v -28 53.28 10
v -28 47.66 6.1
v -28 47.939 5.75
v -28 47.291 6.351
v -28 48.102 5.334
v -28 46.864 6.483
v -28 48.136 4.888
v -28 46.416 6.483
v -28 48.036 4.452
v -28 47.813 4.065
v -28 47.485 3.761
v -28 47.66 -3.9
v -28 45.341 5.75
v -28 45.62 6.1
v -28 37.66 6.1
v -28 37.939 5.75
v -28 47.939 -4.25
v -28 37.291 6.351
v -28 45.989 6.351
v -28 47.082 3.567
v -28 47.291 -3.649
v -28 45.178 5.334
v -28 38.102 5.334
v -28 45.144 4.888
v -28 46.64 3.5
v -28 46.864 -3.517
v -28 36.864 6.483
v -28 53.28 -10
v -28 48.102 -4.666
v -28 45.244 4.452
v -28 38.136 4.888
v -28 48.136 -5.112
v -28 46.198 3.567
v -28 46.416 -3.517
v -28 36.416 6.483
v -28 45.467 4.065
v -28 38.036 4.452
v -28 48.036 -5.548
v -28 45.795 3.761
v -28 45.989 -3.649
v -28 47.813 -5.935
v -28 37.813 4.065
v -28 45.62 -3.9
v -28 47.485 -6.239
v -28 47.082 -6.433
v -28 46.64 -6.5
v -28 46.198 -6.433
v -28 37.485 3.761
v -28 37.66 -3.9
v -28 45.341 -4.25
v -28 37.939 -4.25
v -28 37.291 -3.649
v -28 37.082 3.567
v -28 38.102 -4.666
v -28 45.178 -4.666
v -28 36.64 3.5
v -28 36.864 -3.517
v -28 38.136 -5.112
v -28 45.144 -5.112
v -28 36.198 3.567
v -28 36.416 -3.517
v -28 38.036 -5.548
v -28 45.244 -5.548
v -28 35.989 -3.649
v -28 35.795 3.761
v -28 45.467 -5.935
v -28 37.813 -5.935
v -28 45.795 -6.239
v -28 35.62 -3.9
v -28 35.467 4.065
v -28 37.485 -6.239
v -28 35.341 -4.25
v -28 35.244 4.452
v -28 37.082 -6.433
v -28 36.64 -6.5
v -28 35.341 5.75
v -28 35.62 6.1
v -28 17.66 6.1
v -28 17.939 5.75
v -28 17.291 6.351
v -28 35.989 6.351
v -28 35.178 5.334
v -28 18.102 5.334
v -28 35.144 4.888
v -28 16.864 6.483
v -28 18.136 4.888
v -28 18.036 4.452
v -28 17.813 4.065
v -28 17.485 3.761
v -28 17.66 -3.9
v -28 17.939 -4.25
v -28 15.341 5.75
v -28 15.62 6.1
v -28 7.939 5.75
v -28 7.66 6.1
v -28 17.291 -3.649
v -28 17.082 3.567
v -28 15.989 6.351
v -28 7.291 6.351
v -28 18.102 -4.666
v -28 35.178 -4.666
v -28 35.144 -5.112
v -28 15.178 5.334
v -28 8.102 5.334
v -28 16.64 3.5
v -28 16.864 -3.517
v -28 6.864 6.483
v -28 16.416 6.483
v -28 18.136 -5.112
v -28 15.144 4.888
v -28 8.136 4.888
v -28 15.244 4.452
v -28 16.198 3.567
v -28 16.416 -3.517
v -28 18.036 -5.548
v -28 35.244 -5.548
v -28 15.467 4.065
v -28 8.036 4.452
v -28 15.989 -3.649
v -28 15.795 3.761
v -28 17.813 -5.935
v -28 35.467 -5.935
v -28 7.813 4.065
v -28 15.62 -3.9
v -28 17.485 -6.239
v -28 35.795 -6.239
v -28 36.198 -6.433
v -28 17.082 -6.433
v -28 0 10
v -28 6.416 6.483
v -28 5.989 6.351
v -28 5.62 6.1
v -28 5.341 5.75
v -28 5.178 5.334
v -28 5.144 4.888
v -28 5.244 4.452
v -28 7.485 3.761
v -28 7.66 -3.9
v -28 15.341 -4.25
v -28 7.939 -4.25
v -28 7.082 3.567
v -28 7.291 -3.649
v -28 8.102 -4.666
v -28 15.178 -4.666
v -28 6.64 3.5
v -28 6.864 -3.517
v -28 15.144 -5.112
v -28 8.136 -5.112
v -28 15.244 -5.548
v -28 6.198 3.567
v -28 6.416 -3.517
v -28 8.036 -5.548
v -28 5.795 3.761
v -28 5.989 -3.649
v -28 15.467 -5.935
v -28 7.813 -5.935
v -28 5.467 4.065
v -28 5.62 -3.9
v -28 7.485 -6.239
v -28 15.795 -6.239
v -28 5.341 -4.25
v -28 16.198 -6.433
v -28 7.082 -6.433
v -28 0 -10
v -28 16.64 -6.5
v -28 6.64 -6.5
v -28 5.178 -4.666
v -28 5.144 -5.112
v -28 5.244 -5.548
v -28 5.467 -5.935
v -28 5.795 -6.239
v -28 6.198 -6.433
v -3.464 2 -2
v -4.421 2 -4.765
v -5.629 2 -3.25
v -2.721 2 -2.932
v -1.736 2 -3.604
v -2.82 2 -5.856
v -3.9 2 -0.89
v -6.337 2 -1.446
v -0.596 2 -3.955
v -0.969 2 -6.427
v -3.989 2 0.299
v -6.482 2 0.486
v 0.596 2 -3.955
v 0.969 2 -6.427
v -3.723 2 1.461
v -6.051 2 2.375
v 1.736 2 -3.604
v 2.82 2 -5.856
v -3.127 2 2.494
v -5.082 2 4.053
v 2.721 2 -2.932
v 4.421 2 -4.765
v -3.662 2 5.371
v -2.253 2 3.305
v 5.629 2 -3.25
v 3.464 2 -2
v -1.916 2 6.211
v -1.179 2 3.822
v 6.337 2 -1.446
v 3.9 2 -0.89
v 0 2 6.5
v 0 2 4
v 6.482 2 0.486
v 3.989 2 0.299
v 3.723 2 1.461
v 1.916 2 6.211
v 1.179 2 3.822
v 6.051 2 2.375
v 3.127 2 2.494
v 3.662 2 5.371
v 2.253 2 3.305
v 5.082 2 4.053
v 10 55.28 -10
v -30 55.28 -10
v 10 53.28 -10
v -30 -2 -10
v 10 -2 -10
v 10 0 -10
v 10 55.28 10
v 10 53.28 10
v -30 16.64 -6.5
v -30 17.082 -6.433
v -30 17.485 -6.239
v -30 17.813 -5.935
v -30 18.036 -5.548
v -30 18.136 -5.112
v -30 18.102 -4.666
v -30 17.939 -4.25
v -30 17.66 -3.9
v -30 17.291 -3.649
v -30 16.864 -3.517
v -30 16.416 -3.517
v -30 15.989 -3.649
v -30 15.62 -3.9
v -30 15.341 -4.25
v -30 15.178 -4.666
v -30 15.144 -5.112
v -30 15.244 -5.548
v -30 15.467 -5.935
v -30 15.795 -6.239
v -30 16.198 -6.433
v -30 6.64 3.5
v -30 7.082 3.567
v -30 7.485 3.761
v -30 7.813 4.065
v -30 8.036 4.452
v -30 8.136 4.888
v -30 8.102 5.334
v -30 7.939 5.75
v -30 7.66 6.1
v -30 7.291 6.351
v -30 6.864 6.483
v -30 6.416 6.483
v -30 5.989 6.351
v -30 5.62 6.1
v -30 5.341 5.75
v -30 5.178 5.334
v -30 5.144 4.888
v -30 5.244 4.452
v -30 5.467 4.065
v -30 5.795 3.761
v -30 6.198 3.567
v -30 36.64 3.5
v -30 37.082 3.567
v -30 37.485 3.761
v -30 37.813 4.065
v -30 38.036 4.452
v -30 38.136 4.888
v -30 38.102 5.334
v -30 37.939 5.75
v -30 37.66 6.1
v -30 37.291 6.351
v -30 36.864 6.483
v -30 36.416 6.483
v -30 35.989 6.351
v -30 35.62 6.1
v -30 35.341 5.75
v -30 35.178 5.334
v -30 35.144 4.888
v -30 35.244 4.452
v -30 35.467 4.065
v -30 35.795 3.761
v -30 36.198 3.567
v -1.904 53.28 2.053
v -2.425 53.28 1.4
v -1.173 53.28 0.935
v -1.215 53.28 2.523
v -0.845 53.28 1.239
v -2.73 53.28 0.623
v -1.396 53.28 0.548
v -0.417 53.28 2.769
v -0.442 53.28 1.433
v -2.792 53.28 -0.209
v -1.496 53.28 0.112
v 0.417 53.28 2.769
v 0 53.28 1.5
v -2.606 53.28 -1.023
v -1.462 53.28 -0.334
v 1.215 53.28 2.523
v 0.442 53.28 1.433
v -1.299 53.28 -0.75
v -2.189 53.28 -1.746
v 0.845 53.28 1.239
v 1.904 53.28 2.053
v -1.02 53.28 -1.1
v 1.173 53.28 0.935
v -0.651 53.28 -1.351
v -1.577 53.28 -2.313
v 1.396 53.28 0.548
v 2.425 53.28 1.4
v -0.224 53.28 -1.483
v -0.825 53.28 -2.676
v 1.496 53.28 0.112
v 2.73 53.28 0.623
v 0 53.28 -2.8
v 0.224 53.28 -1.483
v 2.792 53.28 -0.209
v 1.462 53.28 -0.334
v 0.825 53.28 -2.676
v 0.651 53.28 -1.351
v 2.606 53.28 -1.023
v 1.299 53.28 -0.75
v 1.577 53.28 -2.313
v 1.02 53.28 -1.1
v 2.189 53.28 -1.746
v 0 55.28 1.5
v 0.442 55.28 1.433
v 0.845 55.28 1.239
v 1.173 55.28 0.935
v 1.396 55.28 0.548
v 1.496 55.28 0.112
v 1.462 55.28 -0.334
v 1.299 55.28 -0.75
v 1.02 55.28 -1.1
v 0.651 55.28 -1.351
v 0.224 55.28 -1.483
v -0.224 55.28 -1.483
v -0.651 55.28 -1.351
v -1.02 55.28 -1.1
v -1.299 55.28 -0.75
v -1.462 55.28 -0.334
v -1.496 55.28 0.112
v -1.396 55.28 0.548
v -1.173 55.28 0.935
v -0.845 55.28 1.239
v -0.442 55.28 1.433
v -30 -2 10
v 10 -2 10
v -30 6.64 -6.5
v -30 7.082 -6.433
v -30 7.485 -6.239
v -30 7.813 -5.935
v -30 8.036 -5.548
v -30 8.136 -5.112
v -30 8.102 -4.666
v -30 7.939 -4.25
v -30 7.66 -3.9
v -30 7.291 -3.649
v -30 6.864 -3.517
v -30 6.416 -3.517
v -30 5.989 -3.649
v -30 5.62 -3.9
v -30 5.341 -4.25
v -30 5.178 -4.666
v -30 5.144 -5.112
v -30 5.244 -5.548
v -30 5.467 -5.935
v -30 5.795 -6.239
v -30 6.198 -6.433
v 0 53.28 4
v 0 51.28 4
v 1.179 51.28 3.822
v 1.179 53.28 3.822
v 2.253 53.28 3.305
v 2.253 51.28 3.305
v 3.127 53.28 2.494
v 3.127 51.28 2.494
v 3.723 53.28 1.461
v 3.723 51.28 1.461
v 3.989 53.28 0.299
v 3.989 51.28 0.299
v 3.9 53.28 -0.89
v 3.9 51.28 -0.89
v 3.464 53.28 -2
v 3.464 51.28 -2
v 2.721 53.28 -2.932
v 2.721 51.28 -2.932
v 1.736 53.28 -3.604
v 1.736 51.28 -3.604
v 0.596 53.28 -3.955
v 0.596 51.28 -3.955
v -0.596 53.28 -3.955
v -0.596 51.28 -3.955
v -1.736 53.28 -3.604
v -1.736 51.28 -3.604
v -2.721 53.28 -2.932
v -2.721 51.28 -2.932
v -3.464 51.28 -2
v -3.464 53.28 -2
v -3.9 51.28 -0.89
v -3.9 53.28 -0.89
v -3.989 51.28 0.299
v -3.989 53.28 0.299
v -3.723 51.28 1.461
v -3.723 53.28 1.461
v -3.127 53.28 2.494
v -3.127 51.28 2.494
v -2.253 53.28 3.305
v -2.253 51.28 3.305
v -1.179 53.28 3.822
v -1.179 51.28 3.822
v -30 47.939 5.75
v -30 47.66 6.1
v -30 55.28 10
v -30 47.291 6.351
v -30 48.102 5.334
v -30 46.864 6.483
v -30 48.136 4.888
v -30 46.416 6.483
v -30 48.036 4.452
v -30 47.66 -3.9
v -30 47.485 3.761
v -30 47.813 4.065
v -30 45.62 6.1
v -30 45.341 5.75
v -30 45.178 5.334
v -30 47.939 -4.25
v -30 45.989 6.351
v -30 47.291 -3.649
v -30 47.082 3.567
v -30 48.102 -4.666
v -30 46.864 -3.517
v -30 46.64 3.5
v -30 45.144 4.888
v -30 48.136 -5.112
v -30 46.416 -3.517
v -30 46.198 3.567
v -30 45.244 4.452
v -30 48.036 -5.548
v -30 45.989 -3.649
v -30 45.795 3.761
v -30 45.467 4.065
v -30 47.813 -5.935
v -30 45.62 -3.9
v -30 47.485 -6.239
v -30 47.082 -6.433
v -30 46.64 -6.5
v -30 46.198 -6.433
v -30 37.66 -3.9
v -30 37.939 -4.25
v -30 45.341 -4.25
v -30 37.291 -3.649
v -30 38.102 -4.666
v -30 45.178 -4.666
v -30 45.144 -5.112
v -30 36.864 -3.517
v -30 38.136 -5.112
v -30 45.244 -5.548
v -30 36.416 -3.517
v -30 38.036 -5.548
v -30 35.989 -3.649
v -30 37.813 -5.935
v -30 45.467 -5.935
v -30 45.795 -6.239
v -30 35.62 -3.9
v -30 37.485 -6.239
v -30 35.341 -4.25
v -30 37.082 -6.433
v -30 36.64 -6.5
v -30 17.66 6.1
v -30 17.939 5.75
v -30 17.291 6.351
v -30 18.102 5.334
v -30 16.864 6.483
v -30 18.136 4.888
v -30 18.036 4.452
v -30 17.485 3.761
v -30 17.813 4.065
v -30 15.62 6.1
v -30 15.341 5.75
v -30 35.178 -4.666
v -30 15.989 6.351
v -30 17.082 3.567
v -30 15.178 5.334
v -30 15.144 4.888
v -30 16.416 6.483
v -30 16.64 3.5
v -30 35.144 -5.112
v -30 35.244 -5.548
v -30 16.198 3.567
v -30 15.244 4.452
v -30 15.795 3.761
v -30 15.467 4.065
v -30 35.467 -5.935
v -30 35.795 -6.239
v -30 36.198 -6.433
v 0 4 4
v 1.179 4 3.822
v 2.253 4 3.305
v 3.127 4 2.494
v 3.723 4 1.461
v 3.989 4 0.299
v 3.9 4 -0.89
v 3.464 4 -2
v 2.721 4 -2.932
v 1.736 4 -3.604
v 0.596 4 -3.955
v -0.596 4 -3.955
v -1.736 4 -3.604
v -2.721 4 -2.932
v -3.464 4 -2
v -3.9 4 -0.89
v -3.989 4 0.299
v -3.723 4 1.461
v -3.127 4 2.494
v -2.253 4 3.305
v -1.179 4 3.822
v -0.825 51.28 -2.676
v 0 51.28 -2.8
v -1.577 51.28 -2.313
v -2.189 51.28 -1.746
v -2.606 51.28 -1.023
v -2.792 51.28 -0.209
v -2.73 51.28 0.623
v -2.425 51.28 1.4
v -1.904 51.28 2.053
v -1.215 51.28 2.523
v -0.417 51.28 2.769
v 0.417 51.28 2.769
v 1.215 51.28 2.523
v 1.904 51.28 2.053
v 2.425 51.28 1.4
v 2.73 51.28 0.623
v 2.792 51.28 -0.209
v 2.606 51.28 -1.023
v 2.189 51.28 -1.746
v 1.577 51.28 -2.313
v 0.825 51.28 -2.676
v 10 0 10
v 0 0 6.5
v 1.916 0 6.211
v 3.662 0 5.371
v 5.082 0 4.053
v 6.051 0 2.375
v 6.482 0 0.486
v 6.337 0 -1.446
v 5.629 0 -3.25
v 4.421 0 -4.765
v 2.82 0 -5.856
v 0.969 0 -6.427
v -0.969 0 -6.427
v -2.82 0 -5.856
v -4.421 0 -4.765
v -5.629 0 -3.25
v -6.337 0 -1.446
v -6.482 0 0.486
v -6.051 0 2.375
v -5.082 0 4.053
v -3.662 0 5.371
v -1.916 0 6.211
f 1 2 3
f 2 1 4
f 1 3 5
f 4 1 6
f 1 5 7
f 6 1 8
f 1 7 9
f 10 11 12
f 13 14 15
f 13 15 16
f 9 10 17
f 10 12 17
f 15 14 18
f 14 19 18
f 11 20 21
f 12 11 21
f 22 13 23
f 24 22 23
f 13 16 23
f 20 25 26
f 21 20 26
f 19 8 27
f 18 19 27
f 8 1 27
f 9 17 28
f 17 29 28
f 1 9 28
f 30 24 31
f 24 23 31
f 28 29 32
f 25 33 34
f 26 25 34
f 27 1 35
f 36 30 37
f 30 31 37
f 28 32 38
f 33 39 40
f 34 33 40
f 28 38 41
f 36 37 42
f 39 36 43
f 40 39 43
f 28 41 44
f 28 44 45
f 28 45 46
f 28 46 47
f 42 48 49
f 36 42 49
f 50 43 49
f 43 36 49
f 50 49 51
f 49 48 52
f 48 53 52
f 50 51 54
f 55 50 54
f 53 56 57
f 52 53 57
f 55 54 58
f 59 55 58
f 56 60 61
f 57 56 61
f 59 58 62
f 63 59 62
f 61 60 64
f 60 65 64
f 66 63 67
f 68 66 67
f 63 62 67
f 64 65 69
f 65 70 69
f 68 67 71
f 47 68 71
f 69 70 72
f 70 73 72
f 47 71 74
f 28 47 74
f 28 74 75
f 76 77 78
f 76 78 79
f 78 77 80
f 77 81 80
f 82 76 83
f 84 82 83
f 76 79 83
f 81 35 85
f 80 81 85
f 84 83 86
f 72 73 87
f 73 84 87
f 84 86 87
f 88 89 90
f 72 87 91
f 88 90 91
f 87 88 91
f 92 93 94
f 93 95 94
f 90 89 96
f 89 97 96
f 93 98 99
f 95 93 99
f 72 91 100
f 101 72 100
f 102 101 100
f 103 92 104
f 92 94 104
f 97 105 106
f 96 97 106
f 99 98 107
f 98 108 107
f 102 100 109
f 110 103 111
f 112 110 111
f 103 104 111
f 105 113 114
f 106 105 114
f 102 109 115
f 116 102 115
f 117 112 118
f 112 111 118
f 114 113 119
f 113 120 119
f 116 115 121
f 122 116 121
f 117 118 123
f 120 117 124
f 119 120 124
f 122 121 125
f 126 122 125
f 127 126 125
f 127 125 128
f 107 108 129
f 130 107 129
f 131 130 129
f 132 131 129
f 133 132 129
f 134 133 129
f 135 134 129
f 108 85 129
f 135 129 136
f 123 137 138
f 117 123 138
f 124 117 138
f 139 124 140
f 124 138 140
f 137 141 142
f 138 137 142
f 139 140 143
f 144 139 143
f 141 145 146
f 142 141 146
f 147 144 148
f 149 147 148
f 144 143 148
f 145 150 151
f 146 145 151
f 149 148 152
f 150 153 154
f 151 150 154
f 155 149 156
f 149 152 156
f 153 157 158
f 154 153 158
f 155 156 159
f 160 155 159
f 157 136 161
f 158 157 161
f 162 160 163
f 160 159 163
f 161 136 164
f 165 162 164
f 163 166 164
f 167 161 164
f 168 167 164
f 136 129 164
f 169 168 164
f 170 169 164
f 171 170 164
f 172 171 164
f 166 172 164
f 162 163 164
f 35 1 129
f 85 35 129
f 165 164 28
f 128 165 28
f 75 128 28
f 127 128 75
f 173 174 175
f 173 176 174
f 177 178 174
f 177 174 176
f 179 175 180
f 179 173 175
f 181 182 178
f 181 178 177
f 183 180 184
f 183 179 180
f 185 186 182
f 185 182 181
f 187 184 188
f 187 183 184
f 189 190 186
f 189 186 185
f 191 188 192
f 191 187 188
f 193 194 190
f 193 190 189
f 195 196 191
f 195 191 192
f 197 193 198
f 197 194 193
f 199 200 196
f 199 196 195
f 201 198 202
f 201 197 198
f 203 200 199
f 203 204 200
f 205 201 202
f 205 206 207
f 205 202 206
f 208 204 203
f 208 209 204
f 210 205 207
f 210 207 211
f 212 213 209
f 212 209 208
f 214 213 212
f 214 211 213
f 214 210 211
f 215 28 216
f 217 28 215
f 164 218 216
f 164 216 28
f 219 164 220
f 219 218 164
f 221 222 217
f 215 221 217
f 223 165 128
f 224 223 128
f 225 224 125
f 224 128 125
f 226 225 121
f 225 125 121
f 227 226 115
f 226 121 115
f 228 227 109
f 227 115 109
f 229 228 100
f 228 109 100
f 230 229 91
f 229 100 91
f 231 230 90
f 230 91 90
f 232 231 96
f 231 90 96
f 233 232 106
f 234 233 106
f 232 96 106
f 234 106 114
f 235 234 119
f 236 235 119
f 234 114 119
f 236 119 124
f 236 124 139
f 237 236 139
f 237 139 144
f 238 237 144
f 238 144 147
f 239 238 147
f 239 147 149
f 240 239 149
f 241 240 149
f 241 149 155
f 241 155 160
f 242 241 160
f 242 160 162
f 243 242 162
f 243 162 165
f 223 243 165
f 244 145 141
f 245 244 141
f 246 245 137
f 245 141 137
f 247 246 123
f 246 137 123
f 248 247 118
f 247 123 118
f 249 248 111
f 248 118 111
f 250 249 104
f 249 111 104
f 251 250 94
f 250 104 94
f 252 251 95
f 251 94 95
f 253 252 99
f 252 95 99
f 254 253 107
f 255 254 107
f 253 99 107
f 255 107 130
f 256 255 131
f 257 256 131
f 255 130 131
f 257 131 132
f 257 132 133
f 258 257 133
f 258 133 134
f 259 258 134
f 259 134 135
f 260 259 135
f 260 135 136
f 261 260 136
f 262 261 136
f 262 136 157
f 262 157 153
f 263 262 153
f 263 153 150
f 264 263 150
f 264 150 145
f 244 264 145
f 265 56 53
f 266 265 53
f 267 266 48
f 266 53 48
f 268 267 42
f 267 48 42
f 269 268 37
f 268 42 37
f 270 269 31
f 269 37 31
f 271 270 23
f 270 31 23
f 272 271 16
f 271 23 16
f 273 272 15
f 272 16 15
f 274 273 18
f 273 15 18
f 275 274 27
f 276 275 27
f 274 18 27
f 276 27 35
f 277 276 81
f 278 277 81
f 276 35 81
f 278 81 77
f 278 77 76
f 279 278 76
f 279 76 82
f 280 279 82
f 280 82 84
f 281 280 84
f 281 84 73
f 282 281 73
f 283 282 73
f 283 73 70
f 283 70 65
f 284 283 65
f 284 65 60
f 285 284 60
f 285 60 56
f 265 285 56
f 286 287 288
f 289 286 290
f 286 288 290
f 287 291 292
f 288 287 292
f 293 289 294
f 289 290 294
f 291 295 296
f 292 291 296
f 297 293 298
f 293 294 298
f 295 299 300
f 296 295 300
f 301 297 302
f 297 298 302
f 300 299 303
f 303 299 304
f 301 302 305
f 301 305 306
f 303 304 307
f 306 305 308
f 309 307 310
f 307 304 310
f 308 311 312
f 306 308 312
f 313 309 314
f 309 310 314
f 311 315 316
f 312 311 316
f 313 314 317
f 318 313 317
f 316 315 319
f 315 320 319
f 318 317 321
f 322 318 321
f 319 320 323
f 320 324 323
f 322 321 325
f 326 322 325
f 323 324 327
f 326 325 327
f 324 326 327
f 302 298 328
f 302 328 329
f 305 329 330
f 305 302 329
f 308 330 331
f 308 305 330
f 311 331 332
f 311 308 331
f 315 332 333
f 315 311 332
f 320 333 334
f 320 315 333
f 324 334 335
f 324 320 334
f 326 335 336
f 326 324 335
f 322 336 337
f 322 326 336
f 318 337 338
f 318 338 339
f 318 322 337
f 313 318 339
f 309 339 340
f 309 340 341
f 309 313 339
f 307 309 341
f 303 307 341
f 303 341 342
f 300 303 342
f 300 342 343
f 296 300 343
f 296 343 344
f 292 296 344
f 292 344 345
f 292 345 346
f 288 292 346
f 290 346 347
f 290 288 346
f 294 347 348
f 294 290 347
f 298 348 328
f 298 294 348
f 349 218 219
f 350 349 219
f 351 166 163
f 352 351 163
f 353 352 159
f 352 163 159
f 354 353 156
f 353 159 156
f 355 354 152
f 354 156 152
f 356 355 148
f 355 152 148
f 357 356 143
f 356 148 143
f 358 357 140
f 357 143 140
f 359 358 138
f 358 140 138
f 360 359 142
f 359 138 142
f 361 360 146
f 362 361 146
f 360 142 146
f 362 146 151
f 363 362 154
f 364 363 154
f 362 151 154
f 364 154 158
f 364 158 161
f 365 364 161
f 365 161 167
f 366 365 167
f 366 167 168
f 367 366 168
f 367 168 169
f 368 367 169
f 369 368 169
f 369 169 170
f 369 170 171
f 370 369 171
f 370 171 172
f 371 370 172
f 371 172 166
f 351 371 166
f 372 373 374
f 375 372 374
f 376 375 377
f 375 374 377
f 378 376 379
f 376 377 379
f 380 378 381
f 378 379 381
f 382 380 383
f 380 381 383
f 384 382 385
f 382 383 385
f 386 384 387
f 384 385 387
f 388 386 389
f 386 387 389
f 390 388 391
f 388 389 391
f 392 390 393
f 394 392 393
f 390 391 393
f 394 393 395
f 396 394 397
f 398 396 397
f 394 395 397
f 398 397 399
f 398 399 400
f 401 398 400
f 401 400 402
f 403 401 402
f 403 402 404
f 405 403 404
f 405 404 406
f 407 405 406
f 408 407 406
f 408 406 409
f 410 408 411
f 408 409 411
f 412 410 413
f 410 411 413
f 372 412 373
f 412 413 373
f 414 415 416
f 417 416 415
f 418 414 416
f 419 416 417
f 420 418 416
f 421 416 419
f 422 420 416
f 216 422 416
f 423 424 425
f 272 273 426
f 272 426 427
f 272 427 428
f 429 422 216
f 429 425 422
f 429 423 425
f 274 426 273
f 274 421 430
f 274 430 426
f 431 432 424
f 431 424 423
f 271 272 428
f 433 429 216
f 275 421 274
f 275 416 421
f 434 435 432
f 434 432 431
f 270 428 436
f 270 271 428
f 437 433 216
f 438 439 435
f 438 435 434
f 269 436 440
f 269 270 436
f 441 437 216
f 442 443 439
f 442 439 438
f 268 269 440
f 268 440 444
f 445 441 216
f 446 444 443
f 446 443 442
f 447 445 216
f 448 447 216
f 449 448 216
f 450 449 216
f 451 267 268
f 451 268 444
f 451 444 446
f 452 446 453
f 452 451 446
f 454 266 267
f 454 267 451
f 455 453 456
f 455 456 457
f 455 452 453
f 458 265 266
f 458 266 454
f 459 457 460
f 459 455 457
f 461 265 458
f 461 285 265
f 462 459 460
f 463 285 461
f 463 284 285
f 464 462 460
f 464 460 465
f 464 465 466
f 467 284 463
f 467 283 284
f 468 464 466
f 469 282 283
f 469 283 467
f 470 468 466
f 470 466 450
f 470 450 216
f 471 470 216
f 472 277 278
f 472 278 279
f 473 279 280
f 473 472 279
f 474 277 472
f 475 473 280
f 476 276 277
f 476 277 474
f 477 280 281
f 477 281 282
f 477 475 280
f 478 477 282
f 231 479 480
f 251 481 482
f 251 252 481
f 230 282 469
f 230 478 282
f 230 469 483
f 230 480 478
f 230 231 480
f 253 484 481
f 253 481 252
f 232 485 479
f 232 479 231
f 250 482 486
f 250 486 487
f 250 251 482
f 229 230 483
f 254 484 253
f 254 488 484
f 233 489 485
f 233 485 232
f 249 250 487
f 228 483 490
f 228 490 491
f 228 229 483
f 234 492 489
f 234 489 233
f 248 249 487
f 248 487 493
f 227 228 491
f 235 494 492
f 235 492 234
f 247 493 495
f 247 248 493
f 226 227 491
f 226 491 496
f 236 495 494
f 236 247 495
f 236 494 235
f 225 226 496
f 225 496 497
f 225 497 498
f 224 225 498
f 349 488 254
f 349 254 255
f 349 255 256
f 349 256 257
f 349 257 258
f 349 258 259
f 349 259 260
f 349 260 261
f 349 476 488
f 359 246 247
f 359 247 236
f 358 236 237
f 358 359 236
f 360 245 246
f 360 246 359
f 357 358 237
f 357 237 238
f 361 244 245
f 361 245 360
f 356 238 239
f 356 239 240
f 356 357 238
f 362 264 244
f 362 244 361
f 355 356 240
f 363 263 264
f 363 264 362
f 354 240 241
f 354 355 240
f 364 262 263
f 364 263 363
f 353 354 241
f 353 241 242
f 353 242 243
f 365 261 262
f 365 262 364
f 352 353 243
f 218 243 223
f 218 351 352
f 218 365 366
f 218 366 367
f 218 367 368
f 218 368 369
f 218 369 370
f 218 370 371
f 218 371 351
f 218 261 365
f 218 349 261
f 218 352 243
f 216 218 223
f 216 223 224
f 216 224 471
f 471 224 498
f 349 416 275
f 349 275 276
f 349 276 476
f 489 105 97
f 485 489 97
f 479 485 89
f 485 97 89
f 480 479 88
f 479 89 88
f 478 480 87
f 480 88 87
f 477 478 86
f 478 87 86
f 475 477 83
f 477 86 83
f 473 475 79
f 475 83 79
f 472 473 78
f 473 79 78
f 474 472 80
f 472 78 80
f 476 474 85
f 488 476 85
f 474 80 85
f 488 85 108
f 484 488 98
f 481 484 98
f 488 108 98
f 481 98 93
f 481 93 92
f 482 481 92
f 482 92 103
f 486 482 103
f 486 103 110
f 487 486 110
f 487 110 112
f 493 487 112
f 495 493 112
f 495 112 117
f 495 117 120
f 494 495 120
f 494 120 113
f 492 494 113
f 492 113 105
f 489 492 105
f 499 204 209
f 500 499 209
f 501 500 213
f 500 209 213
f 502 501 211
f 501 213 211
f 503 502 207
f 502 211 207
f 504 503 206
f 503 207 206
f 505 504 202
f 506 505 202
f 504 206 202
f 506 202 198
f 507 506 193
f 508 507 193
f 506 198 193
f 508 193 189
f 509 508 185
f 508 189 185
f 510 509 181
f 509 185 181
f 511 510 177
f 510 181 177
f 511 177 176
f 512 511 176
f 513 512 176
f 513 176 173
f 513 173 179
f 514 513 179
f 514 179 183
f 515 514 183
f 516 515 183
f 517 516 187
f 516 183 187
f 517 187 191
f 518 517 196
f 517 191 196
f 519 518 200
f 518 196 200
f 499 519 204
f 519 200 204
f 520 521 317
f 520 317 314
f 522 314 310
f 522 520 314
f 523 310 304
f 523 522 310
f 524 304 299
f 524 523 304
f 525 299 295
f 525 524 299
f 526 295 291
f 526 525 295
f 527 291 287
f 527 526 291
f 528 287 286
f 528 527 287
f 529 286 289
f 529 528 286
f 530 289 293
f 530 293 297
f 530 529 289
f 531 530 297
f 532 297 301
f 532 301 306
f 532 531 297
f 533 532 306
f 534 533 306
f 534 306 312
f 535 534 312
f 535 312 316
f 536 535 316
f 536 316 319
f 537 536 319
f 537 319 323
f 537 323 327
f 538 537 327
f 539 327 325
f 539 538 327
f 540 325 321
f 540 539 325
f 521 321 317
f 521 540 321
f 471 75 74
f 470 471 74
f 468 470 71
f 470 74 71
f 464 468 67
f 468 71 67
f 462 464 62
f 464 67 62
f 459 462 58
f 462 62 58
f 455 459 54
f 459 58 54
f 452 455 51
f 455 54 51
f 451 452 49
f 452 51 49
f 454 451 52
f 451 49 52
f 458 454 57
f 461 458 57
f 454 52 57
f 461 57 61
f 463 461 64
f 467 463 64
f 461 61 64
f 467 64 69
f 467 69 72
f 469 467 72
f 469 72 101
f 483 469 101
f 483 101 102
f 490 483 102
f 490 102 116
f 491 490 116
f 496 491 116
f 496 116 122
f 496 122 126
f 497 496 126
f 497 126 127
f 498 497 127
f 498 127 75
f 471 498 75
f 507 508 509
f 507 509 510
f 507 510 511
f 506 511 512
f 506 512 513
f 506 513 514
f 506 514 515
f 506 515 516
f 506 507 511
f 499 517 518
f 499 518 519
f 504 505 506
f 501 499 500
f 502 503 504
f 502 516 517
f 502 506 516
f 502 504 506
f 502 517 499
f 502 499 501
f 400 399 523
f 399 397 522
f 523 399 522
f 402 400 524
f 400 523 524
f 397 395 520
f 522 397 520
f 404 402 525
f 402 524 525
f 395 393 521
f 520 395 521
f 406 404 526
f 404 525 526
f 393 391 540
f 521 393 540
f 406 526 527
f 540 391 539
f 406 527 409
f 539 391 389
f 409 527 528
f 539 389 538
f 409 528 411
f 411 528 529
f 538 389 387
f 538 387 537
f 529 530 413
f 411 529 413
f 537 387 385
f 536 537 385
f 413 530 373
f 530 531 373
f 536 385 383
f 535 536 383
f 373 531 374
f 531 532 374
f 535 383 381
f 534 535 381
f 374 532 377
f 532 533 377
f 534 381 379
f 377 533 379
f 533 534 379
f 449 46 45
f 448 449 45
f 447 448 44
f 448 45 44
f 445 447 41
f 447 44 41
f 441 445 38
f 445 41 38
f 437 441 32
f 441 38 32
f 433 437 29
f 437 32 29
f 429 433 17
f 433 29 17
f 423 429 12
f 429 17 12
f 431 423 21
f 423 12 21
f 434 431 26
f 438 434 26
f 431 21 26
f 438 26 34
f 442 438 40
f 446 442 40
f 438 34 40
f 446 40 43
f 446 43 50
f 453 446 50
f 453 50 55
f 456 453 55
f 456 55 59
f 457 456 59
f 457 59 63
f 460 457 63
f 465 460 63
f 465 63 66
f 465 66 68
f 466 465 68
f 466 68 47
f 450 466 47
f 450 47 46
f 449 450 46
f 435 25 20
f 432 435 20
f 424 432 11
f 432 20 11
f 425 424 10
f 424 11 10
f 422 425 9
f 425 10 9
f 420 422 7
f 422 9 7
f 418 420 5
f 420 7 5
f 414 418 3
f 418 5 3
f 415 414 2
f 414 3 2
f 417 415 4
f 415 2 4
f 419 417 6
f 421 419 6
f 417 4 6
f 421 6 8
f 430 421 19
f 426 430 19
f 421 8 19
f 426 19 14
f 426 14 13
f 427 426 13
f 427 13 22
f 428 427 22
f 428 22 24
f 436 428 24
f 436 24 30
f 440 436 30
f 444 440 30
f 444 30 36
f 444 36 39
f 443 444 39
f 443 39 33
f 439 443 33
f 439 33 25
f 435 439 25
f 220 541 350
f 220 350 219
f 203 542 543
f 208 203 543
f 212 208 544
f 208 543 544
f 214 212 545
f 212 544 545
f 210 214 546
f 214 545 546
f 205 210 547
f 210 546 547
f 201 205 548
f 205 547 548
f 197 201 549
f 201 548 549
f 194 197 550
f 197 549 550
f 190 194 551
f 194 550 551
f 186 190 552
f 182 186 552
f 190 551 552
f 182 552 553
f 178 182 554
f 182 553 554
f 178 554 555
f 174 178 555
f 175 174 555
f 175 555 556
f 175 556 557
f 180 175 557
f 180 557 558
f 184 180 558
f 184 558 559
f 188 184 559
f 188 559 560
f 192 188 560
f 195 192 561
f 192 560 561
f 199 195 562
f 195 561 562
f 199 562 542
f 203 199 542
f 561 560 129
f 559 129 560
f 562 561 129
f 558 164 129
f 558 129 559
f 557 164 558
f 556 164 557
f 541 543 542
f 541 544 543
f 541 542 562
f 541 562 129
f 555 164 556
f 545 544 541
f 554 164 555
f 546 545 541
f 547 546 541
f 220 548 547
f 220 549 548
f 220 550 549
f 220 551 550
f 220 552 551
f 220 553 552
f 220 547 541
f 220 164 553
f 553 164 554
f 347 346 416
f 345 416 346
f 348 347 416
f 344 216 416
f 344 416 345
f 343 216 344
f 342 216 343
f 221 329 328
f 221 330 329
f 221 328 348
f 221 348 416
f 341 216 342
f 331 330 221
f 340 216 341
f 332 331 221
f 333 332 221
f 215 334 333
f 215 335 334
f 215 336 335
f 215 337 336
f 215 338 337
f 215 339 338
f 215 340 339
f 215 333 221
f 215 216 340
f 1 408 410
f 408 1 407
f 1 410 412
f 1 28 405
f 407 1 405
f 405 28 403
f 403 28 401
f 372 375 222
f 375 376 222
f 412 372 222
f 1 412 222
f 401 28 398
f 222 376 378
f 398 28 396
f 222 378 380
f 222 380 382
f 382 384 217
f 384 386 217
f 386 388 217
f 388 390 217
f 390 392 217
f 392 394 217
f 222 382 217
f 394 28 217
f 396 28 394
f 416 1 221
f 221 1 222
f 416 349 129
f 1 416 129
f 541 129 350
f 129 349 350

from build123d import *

# Parameters (mm, degrees)
SKETCH1_R                 = 6.5
SKETCH1_R_2               = 4
SKETCH1_R_3               = 2.8
SKETCH1_R_4               = 1.5
BOSS_EXTRUDE1_DEPTH       = 2
BOSS_EXTRUDE2_START       = 2
SKETCH1_3_R               = 4
SKETCH1_3_R_2             = 2.8
SKETCH1_3_R_3             = 1.5
BOSS_EXTRUDE2_DEPTH       = 2
SKETCH1_4_W               = 40
SKETCH1_4_H               = 20
BOSS_EXTRUDE3_DEPTH       = 2
SKETCH2_W                 = 2
SKETCH2_H                 = 20
BOSS_EXTRUDE4_DEPTH       = 53.28
BOSS_EXTRUDE5_START       = 53.28
SKETCH1_5_W               = 40
SKETCH1_5_H               = 20
SKETCH1_5_R               = 6.5
SKETCH1_5_R_2             = 4
SKETCH1_5_R_3             = 2.8
SKETCH1_5_R_4             = 1.5
BOSS_EXTRUDE5_DEPTH       = 2
BOSS_EXTRUDE6_START       = 51.28
SKETCH1_6_R               = 4
SKETCH1_6_R_2             = 2.8
BOSS_EXTRUDE6_DEPTH       = 2
F_3_0MM_DOWEL_HOLE1_D     = 3
F_3_0MM_DOWEL_HOLE1_DEPTH = 7
F_3_0MM_DOWEL_HOLE1_TIP   = 0.901290929


with BuildPart() as part:
    # Sketch1 → Boss-Extrude1 (new body)
    # profile 1 of 4: a face of its own
    with BuildSketch(Plane(origin=(0, 0, 0), x_dir=(1, 0, 0), z_dir=(0, 1, 0))):
        with Locations(Location((0, 0, 0), (0, 0, 270))):
            Circle(SKETCH1_R)
        Circle(SKETCH1_R_2, mode=Mode.SUBTRACT)
    # profile 2 of 4: a face of its own
    with BuildSketch(Plane(origin=(0, 0, 0), x_dir=(1, 0, 0), z_dir=(0, 1, 0))):
        Circle(SKETCH1_R_2)
        Circle(SKETCH1_R_3, mode=Mode.SUBTRACT)
    # profile 3 of 4: a face of its own
    with BuildSketch(Plane(origin=(0, 0, 0), x_dir=(1, 0, 0), z_dir=(0, 1, 0))):
        Circle(SKETCH1_R_3)
        Circle(SKETCH1_R_4, mode=Mode.SUBTRACT)
    # profile 4 of 4: a face of its own
    with BuildSketch(Plane(origin=(0, 0, 0), x_dir=(1, 0, 0), z_dir=(0, 1, 0))):
        Circle(SKETCH1_R_4)
    extrude(amount=BOSS_EXTRUDE1_DEPTH)

    # Sketch1<3> → Boss-Extrude2 (add)
    # profile 1 of 3: a face of its own
    with BuildSketch(Plane(origin=(0, 0, 0), x_dir=(1, 0, 0), z_dir=(0, 1, 0)).offset(BOSS_EXTRUDE2_START)):
        with Locations(Location((0, 0, 0), (0, 0, 270))):
            Circle(SKETCH1_3_R)
        Circle(SKETCH1_3_R_2, mode=Mode.SUBTRACT)
    # profile 2 of 3: a face of its own
    with BuildSketch(Plane(origin=(0, 0, 0), x_dir=(1, 0, 0), z_dir=(0, 1, 0)).offset(BOSS_EXTRUDE2_START)):
        Circle(SKETCH1_3_R_2)
        Circle(SKETCH1_3_R_3, mode=Mode.SUBTRACT)
    # profile 3 of 3: a face of its own
    with BuildSketch(Plane(origin=(0, 0, 0), x_dir=(1, 0, 0), z_dir=(0, 1, 0)).offset(BOSS_EXTRUDE2_START)):
        Circle(SKETCH1_3_R_3)
    extrude(amount=BOSS_EXTRUDE2_DEPTH)

    # Sketch1<4> → Boss-Extrude3 (add)
    with BuildSketch(Plane(origin=(0, 0, 0), x_dir=(1, 0, 0), z_dir=(0, 1, 0))):
        with Locations((-10, 0)):
            Rectangle(SKETCH1_4_W, SKETCH1_4_H)
    extrude(amount=-BOSS_EXTRUDE3_DEPTH)

    # Sketch2 → Boss-Extrude4 (add)
    with BuildSketch(Plane(origin=(0, 0, 0), x_dir=(1, 0, 0), z_dir=(0, 1, 0))):
        with Locations((-29, 0)):
            Rectangle(SKETCH2_W, SKETCH2_H)
    extrude(amount=BOSS_EXTRUDE4_DEPTH)

    # Sketch1<5> → Boss-Extrude5 (add)
    # profile 1 of 4: a face of its own
    with BuildSketch(Plane(origin=(0, 0, 0), x_dir=(1, 0, 0), z_dir=(0, 1, 0)).offset(BOSS_EXTRUDE5_START)):
        with Locations((-10, 0)):
            Rectangle(SKETCH1_5_W, SKETCH1_5_H)
        with Locations(Location((0, 0, 0), (0, 0, 270))):
            Circle(SKETCH1_5_R, mode=Mode.SUBTRACT)
    # profile 2 of 4: a face of its own
    with BuildSketch(Plane(origin=(0, 0, 0), x_dir=(1, 0, 0), z_dir=(0, 1, 0)).offset(BOSS_EXTRUDE5_START)):
        with Locations(Location((0, 0, 0), (0, 0, 270))):
            Circle(SKETCH1_5_R)
        with Locations(Location((0, 0, 0), (0, 0, 270))):
            Circle(SKETCH1_5_R_2, mode=Mode.SUBTRACT)
    # profile 3 of 4: a face of its own
    with BuildSketch(Plane(origin=(0, 0, 0), x_dir=(1, 0, 0), z_dir=(0, 1, 0)).offset(BOSS_EXTRUDE5_START)):
        with Locations(Location((0, 0, 0), (0, 0, 270))):
            Circle(SKETCH1_5_R_2)
        Circle(SKETCH1_5_R_3, mode=Mode.SUBTRACT)
    # profile 4 of 4: a face of its own
    with BuildSketch(Plane(origin=(0, 0, 0), x_dir=(1, 0, 0), z_dir=(0, 1, 0)).offset(BOSS_EXTRUDE5_START)):
        Circle(SKETCH1_5_R_3)
        with Locations(Location((0, 0, 0), (0, 0, 270))):
            Circle(SKETCH1_5_R_4, mode=Mode.SUBTRACT)
    extrude(amount=BOSS_EXTRUDE5_DEPTH)

    # Sketch1<6> → Boss-Extrude6 (add)
    with BuildSketch(Plane(origin=(0, 0, 0), x_dir=(1, 0, 0), z_dir=(0, 1, 0)).offset(BOSS_EXTRUDE6_START)):
        with Locations(Location((0, 0, 0), (0, 0, 270))):
            Circle(SKETCH1_6_R)
        with Locations(Location((0, 0, 0), (0, 0, 90))):
            Circle(SKETCH1_6_R_2, mode=Mode.SUBTRACT)
    extrude(amount=BOSS_EXTRUDE6_DEPTH)

    # Ø3.0mm Dowel Hole1
    with Locations(Plane.ZY.offset(30)):
        with Locations((-5, 46.64), (5, 46.64), (-5, 36.64), (5, 36.64), (-5, 16.64), (5, 16.64), (-5, 6.64), (5, 6.64)):
            Hole(F_3_0MM_DOWEL_HOLE1_D / 2, depth=F_3_0MM_DOWEL_HOLE1_DEPTH)
            with Locations((0, 0, -(F_3_0MM_DOWEL_HOLE1_DEPTH + F_3_0MM_DOWEL_HOLE1_TIP / 2))):  # 118° drill point
                Cone(0, F_3_0MM_DOWEL_HOLE1_D / 2, F_3_0MM_DOWEL_HOLE1_TIP, mode=Mode.SUBTRACT)


solid = part.part
